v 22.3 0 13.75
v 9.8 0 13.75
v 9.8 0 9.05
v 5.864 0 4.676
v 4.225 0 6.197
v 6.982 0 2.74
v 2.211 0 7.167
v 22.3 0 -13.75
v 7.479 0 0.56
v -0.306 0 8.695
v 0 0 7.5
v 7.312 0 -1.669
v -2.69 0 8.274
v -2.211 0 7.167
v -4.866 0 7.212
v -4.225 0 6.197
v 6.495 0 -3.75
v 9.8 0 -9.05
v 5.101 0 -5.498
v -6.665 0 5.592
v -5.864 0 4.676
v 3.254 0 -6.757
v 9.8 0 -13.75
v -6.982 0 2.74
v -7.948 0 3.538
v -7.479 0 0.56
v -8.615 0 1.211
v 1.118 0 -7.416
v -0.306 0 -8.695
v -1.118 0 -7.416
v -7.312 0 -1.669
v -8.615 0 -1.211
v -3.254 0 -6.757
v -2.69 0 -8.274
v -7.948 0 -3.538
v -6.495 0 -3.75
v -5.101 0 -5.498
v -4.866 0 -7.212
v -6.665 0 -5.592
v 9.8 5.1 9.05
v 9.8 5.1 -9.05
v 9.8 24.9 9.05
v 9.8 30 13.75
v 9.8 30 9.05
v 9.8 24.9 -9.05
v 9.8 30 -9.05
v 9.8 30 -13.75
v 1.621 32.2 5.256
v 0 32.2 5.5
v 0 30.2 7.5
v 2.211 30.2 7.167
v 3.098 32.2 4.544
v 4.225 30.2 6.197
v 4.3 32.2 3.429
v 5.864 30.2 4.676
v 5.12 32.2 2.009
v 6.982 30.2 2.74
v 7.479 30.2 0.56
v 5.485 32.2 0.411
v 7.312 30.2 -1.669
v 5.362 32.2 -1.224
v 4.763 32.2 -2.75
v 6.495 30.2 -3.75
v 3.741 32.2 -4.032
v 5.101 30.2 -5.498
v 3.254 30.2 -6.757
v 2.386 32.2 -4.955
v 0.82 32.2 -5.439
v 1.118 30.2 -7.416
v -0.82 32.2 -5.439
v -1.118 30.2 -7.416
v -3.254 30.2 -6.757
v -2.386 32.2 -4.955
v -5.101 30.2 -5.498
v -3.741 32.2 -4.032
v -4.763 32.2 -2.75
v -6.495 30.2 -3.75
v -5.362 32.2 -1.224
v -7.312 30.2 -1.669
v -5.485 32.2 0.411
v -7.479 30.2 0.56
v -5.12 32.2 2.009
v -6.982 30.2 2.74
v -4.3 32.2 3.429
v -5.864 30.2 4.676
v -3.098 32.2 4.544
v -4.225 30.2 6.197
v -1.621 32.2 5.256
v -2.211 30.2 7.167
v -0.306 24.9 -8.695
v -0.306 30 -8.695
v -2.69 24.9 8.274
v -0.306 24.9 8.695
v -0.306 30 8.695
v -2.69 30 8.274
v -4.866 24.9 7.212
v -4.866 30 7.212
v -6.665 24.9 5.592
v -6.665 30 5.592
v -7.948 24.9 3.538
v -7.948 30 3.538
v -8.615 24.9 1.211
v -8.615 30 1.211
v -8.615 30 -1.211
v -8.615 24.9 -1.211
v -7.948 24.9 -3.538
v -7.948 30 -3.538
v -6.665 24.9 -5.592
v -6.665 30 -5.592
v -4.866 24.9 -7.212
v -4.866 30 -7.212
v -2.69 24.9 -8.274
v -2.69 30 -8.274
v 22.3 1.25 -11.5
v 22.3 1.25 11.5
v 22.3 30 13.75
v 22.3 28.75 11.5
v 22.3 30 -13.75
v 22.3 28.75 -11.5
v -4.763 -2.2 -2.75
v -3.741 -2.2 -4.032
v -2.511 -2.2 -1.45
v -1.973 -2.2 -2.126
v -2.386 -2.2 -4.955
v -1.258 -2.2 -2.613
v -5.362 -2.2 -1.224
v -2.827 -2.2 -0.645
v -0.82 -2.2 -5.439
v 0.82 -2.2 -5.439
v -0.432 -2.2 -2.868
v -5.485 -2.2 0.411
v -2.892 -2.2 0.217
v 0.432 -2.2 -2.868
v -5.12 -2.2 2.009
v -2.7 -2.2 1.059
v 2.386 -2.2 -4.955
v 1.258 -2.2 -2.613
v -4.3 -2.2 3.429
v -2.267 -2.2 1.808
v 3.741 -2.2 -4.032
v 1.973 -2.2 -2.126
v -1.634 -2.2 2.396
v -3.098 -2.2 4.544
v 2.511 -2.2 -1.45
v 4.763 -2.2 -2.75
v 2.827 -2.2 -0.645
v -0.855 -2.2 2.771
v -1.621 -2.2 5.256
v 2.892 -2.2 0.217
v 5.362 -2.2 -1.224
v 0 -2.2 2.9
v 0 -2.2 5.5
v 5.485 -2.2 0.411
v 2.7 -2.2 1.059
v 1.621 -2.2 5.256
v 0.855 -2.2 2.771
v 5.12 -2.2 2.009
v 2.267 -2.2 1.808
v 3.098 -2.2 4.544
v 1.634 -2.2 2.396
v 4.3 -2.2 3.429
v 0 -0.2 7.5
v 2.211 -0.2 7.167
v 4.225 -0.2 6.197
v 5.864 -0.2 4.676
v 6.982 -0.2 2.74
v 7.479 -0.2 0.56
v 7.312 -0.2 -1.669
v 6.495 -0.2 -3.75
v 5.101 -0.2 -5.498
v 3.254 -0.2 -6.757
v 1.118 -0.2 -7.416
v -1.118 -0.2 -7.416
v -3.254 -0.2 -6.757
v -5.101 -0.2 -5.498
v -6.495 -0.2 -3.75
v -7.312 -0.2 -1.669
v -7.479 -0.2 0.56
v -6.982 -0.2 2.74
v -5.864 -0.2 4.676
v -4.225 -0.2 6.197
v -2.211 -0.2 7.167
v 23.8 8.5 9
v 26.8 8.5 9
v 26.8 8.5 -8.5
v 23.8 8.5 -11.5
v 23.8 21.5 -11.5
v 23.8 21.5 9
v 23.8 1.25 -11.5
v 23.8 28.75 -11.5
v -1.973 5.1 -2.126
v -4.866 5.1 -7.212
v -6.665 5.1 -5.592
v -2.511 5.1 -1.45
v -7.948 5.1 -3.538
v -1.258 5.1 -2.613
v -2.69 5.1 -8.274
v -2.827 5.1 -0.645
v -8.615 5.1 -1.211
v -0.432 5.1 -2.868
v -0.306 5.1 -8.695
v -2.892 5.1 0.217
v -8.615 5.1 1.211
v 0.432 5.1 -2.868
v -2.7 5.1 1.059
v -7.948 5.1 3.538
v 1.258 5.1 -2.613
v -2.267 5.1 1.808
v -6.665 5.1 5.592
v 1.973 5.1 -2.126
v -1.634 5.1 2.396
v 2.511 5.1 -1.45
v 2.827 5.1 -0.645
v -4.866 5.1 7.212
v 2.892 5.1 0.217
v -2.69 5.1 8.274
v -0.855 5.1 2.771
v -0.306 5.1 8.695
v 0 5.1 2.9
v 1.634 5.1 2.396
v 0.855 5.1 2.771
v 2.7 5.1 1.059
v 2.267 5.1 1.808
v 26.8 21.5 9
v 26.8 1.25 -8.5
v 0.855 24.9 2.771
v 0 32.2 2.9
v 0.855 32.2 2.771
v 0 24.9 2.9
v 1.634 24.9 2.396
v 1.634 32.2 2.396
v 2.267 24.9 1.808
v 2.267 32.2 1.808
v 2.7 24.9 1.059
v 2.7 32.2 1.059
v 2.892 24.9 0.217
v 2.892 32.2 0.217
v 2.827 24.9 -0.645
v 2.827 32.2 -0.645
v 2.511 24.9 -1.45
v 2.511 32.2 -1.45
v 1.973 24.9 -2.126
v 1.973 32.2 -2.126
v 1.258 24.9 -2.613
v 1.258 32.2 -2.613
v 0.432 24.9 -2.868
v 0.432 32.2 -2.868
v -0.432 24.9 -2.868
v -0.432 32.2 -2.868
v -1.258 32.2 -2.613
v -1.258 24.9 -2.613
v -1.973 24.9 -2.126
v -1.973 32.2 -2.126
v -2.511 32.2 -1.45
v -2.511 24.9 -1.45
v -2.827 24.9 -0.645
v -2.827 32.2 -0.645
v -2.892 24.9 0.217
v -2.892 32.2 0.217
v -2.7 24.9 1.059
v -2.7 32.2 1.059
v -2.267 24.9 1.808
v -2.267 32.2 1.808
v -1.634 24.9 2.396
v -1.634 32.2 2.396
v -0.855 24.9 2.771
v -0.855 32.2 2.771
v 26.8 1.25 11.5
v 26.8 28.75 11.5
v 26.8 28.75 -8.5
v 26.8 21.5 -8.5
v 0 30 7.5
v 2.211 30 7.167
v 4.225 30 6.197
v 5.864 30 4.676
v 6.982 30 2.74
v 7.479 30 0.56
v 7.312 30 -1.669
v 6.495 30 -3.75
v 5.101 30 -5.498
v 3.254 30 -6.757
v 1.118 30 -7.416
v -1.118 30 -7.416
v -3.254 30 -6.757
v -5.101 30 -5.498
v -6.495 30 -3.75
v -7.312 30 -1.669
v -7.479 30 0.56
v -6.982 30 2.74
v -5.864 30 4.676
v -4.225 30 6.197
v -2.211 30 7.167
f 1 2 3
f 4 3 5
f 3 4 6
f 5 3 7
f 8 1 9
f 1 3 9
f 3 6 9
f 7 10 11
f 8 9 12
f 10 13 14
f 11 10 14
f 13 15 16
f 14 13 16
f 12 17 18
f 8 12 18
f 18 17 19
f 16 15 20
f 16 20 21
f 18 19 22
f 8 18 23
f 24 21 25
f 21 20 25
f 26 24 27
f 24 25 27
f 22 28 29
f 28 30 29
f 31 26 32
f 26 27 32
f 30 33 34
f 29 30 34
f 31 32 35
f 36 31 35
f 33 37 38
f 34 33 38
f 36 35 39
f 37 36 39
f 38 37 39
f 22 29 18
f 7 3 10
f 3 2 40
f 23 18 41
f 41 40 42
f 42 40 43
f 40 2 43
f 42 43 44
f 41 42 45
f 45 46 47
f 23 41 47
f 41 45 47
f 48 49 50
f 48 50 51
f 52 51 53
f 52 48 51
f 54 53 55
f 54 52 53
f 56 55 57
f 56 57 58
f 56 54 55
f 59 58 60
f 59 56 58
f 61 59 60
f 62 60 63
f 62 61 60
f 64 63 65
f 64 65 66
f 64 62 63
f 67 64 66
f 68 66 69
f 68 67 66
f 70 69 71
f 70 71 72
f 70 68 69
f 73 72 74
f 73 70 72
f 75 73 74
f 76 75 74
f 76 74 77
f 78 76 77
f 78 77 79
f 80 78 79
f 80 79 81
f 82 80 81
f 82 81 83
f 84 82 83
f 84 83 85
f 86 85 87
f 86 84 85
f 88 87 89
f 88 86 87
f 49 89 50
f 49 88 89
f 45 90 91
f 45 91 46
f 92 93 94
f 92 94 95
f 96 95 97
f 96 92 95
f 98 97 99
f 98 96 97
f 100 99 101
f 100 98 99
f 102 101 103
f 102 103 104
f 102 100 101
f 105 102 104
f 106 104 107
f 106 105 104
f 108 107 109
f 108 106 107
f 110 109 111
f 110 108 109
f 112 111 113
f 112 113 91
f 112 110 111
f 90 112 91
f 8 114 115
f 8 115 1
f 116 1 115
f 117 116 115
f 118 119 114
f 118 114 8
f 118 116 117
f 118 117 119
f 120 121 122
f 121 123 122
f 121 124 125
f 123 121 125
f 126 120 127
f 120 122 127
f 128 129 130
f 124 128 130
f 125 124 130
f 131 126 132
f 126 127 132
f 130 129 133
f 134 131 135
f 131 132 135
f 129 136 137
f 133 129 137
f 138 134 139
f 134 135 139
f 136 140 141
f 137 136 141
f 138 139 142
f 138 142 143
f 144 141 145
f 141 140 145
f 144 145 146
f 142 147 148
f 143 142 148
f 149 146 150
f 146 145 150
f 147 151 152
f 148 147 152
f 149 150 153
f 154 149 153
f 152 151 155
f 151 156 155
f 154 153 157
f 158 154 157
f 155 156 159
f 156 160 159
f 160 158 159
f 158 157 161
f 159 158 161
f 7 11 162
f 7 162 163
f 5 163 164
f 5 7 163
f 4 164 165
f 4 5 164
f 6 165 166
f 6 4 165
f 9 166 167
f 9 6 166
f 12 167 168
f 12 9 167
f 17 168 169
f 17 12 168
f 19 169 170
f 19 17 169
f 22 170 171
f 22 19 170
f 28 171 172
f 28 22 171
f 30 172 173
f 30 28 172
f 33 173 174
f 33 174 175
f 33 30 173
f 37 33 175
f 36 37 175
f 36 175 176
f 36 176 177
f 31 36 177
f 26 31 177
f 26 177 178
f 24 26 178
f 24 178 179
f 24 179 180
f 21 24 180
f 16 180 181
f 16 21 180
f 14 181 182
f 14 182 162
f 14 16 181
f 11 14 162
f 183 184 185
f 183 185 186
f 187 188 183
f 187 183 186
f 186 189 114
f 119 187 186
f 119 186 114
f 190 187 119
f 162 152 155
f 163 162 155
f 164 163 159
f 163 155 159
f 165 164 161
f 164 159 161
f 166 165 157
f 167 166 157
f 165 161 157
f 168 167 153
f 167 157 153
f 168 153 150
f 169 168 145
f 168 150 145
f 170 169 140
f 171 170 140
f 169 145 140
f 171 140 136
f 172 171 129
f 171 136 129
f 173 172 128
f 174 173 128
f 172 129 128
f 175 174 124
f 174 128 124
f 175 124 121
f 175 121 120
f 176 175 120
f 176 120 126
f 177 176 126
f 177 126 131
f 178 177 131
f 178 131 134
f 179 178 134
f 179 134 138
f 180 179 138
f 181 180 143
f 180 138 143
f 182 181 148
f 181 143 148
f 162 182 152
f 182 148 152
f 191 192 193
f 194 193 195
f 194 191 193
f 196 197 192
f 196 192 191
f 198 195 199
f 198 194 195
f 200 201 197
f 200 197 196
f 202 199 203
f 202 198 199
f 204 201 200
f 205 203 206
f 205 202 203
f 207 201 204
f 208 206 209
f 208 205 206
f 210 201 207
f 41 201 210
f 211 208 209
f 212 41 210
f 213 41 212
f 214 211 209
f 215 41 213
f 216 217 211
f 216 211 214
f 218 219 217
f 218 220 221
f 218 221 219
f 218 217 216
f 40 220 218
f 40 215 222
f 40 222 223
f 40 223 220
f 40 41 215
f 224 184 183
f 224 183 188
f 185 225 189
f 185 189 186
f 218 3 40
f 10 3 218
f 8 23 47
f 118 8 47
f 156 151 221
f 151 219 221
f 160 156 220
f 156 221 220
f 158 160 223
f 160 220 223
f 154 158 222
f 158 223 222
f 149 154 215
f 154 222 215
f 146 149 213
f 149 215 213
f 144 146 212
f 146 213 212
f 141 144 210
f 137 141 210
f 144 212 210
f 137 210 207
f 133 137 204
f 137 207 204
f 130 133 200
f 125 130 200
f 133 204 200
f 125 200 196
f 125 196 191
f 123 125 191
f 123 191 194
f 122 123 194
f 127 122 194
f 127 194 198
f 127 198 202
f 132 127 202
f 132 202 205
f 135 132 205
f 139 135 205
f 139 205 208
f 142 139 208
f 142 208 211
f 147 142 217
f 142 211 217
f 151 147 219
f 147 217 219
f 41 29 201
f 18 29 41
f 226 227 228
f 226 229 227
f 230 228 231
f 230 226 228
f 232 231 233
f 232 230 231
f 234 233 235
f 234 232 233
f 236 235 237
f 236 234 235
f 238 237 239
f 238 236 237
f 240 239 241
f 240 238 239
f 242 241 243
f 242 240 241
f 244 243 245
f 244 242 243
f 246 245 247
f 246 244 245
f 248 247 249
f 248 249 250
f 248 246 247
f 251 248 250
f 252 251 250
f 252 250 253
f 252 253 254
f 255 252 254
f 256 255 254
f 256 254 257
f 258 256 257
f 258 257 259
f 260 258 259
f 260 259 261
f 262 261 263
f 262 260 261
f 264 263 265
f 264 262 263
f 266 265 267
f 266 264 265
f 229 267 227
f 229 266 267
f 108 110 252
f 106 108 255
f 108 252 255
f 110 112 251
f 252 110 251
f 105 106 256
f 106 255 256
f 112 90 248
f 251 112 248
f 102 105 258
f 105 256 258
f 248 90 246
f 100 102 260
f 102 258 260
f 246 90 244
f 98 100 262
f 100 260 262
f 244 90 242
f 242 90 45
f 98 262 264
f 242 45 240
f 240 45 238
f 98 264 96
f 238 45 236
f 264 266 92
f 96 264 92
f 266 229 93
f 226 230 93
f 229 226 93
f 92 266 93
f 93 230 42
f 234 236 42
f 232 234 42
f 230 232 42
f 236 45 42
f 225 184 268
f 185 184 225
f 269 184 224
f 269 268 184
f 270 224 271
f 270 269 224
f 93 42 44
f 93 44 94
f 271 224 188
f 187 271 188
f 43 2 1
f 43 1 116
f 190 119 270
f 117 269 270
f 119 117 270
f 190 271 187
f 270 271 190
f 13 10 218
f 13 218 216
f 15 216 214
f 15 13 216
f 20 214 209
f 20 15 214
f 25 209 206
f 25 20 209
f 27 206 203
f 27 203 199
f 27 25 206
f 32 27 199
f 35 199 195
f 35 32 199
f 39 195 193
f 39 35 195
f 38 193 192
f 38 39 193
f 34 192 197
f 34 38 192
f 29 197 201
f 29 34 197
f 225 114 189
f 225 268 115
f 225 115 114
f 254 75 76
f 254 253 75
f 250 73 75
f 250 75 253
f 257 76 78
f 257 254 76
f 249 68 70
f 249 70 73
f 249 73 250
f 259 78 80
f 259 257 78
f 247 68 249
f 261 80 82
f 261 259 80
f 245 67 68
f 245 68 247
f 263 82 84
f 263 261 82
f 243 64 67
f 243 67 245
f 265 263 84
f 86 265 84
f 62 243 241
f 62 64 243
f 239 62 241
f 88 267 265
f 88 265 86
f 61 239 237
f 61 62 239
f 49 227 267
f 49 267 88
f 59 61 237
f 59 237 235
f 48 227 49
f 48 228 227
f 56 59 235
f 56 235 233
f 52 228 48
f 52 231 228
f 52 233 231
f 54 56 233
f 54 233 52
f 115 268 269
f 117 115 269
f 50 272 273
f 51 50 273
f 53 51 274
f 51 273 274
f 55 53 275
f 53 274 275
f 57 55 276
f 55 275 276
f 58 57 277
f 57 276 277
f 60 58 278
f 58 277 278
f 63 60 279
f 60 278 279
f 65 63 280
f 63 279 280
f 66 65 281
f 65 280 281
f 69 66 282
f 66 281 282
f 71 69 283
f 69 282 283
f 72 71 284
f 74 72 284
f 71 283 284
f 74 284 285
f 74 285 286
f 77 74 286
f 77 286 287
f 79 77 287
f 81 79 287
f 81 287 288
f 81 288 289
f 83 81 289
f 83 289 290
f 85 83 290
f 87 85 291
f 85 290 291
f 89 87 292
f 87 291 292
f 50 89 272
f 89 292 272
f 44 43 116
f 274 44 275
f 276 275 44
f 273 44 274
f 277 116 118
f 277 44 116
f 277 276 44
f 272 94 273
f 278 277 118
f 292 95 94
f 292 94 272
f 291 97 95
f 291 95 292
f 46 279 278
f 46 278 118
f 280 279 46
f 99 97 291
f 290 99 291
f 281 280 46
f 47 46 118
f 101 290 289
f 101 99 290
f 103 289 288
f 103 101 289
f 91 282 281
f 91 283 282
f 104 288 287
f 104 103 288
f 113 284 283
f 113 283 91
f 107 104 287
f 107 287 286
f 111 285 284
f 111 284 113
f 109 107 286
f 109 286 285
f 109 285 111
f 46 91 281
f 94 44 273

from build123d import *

# Parameters (mm, degrees)
SKETCH_1_R                 = 2.9
EXTRUDE_1_DEPTH            = 30
SKETCH_2_W                 = 27.5
SKETCH_2_H                 = 30
EXTRUDE_2_DEPTH            = 17
CUT_EXTRUDE_1_REACH        = 39.833
SKETCH_3_W                 = 27.5
SKETCH_3_H                 = 19.8
SKETCH_4_W                 = 27.5
SKETCH_4_H                 = 30
SKETCH_4_W_2               = 23
SKETCH_4_H_2               = 27.5
CUT_EXTRUDE_2_DEPTH        = 4.5
CHAMFER_1_SIZE             = 3
SKETCH_5_W                 = 20.5
SKETCH_5_H                 = 13
CUT_EXTRUDE_3_DEPTH        = 3
SKETCH_6_R                 = 7.5
SKETCH_6_R_2               = 2.9
EXTRUDE_3_DEPTH            = 2.2
CHAMFER_2_SIZE             = 2
CHAMFER_2_OF_MIRROR_1_SIZE = 2


with BuildPart() as part:
    # 草图1 → 凸台-拉伸1 (new body)
    with BuildSketch(Plane(origin=(0, 0, 0), x_dir=(1, 0, 0), z_dir=(0, 1, 0))):
        with BuildLine():
            Line((-0.305751289, 8.694625705), (9.8, 9.05))
            Line((9.8, 9.05), (9.8, -9.05))
            Line((9.8, -9.05), (-0.305751289, -8.694625705))
            ThreePointArc((-0.305751289, -8.694625705), (-8.7, 0), (-0.305751289, 8.694625705))
        make_face()
        with Locations(Location((0, 0, 0), (0, 0, 270))):
            Circle(SKETCH_1_R, mode=Mode.SUBTRACT)
    extrude(amount=EXTRUDE_1_DEPTH)

    # 草图2 → 凸台-拉伸2 (add)
    with BuildSketch(Plane(origin=(9.8, 0, 0), x_dir=(0, 0, -1), z_dir=(1, 0, 0))):
        with Locations((0, 15)):
            Rectangle(SKETCH_2_W, SKETCH_2_H)
    extrude(amount=EXTRUDE_2_DEPTH)

    # 草图3 → 切除-拉伸1 (cut, up to next)
    with BuildSketch(Plane.ZY.offset(-9.8), mode=Mode.PRIVATE) as cut_extrude_1_sk1:
        with Locations((0, 15)):
            Rectangle(SKETCH_3_W, SKETCH_3_H)
    cut_extrude_1_tool1 = extrude(cut_extrude_1_sk1.sketch, amount=CUT_EXTRUDE_1_REACH, mode=Mode.PRIVATE) & part.part
    add(cut_extrude_1_tool1.solids().sort_by_distance((9.8, 15, 0))[0], mode=Mode.SUBTRACT)

    # 草图4 → 切除-拉伸2 (cut)
    with BuildSketch(Plane(origin=(26.8, 0, 0), x_dir=(0, 0, -1), z_dir=(1, 0, 0))):
        with Locations((0, 15)):
            Rectangle(SKETCH_4_W, SKETCH_4_H)
        with Locations((0, 15)):
            Rectangle(SKETCH_4_W_2, SKETCH_4_H_2, mode=Mode.SUBTRACT)
    extrude(amount=-CUT_EXTRUDE_2_DEPTH, mode=Mode.SUBTRACT)

    # 倒角1
    chamfer_1_edges = [part.edges().sort_by_distance(p)[0] for p in [
        (26.8, 15, -11.5),
    ]]
    chamfer(chamfer_1_edges, length=CHAMFER_1_SIZE)

    # 草图5 → 切除-拉伸3 (cut)
    with BuildSketch(Plane(origin=(26.8, 0, 0), x_dir=(0, 0, -1), z_dir=(1, 0, 0))):
        with Locations((1.25, 15)):
            Rectangle(SKETCH_5_W, SKETCH_5_H)
    extrude(amount=-CUT_EXTRUDE_3_DEPTH, mode=Mode.SUBTRACT)

    # 草图6 → 凸台-拉伸3 (add)
    with BuildSketch(Plane(origin=(0, 30, 0), x_dir=(1, 0, 0), z_dir=(0, 1, 0))):
        with Locations(Location((0, 0, 0), (0, 0, 270))):
            Circle(SKETCH_6_R)
        with Locations(Location((0, 0, 0), (0, 0, 270))):
            Circle(SKETCH_6_R_2, mode=Mode.SUBTRACT)
    extrude_3 = extrude(amount=EXTRUDE_3_DEPTH)

    # 倒角2
    chamfer_2_edges = [part.edges().sort_by_distance(p)[0] for p in [
        (0, 32.2, -7.5),
    ]]
    chamfer(chamfer_2_edges, length=CHAMFER_2_SIZE)

    # 镜向1: 凸台-拉伸3 across plane
    add(extrude_3.mirror(Plane(origin=(0, 15, 0), x_dir=(0, 0, 1), z_dir=(0, -1, 0))))

    # 倒角2 of 镜向1
    chamfer_2_of_mirror_1_edges = [part.edges().sort_by_distance(p)[0] for p in [
        (0, -2.2, -7.5),
    ]]
    chamfer(chamfer_2_of_mirror_1_edges, length=CHAMFER_2_OF_MIRROR_1_SIZE)


solid = part.part
